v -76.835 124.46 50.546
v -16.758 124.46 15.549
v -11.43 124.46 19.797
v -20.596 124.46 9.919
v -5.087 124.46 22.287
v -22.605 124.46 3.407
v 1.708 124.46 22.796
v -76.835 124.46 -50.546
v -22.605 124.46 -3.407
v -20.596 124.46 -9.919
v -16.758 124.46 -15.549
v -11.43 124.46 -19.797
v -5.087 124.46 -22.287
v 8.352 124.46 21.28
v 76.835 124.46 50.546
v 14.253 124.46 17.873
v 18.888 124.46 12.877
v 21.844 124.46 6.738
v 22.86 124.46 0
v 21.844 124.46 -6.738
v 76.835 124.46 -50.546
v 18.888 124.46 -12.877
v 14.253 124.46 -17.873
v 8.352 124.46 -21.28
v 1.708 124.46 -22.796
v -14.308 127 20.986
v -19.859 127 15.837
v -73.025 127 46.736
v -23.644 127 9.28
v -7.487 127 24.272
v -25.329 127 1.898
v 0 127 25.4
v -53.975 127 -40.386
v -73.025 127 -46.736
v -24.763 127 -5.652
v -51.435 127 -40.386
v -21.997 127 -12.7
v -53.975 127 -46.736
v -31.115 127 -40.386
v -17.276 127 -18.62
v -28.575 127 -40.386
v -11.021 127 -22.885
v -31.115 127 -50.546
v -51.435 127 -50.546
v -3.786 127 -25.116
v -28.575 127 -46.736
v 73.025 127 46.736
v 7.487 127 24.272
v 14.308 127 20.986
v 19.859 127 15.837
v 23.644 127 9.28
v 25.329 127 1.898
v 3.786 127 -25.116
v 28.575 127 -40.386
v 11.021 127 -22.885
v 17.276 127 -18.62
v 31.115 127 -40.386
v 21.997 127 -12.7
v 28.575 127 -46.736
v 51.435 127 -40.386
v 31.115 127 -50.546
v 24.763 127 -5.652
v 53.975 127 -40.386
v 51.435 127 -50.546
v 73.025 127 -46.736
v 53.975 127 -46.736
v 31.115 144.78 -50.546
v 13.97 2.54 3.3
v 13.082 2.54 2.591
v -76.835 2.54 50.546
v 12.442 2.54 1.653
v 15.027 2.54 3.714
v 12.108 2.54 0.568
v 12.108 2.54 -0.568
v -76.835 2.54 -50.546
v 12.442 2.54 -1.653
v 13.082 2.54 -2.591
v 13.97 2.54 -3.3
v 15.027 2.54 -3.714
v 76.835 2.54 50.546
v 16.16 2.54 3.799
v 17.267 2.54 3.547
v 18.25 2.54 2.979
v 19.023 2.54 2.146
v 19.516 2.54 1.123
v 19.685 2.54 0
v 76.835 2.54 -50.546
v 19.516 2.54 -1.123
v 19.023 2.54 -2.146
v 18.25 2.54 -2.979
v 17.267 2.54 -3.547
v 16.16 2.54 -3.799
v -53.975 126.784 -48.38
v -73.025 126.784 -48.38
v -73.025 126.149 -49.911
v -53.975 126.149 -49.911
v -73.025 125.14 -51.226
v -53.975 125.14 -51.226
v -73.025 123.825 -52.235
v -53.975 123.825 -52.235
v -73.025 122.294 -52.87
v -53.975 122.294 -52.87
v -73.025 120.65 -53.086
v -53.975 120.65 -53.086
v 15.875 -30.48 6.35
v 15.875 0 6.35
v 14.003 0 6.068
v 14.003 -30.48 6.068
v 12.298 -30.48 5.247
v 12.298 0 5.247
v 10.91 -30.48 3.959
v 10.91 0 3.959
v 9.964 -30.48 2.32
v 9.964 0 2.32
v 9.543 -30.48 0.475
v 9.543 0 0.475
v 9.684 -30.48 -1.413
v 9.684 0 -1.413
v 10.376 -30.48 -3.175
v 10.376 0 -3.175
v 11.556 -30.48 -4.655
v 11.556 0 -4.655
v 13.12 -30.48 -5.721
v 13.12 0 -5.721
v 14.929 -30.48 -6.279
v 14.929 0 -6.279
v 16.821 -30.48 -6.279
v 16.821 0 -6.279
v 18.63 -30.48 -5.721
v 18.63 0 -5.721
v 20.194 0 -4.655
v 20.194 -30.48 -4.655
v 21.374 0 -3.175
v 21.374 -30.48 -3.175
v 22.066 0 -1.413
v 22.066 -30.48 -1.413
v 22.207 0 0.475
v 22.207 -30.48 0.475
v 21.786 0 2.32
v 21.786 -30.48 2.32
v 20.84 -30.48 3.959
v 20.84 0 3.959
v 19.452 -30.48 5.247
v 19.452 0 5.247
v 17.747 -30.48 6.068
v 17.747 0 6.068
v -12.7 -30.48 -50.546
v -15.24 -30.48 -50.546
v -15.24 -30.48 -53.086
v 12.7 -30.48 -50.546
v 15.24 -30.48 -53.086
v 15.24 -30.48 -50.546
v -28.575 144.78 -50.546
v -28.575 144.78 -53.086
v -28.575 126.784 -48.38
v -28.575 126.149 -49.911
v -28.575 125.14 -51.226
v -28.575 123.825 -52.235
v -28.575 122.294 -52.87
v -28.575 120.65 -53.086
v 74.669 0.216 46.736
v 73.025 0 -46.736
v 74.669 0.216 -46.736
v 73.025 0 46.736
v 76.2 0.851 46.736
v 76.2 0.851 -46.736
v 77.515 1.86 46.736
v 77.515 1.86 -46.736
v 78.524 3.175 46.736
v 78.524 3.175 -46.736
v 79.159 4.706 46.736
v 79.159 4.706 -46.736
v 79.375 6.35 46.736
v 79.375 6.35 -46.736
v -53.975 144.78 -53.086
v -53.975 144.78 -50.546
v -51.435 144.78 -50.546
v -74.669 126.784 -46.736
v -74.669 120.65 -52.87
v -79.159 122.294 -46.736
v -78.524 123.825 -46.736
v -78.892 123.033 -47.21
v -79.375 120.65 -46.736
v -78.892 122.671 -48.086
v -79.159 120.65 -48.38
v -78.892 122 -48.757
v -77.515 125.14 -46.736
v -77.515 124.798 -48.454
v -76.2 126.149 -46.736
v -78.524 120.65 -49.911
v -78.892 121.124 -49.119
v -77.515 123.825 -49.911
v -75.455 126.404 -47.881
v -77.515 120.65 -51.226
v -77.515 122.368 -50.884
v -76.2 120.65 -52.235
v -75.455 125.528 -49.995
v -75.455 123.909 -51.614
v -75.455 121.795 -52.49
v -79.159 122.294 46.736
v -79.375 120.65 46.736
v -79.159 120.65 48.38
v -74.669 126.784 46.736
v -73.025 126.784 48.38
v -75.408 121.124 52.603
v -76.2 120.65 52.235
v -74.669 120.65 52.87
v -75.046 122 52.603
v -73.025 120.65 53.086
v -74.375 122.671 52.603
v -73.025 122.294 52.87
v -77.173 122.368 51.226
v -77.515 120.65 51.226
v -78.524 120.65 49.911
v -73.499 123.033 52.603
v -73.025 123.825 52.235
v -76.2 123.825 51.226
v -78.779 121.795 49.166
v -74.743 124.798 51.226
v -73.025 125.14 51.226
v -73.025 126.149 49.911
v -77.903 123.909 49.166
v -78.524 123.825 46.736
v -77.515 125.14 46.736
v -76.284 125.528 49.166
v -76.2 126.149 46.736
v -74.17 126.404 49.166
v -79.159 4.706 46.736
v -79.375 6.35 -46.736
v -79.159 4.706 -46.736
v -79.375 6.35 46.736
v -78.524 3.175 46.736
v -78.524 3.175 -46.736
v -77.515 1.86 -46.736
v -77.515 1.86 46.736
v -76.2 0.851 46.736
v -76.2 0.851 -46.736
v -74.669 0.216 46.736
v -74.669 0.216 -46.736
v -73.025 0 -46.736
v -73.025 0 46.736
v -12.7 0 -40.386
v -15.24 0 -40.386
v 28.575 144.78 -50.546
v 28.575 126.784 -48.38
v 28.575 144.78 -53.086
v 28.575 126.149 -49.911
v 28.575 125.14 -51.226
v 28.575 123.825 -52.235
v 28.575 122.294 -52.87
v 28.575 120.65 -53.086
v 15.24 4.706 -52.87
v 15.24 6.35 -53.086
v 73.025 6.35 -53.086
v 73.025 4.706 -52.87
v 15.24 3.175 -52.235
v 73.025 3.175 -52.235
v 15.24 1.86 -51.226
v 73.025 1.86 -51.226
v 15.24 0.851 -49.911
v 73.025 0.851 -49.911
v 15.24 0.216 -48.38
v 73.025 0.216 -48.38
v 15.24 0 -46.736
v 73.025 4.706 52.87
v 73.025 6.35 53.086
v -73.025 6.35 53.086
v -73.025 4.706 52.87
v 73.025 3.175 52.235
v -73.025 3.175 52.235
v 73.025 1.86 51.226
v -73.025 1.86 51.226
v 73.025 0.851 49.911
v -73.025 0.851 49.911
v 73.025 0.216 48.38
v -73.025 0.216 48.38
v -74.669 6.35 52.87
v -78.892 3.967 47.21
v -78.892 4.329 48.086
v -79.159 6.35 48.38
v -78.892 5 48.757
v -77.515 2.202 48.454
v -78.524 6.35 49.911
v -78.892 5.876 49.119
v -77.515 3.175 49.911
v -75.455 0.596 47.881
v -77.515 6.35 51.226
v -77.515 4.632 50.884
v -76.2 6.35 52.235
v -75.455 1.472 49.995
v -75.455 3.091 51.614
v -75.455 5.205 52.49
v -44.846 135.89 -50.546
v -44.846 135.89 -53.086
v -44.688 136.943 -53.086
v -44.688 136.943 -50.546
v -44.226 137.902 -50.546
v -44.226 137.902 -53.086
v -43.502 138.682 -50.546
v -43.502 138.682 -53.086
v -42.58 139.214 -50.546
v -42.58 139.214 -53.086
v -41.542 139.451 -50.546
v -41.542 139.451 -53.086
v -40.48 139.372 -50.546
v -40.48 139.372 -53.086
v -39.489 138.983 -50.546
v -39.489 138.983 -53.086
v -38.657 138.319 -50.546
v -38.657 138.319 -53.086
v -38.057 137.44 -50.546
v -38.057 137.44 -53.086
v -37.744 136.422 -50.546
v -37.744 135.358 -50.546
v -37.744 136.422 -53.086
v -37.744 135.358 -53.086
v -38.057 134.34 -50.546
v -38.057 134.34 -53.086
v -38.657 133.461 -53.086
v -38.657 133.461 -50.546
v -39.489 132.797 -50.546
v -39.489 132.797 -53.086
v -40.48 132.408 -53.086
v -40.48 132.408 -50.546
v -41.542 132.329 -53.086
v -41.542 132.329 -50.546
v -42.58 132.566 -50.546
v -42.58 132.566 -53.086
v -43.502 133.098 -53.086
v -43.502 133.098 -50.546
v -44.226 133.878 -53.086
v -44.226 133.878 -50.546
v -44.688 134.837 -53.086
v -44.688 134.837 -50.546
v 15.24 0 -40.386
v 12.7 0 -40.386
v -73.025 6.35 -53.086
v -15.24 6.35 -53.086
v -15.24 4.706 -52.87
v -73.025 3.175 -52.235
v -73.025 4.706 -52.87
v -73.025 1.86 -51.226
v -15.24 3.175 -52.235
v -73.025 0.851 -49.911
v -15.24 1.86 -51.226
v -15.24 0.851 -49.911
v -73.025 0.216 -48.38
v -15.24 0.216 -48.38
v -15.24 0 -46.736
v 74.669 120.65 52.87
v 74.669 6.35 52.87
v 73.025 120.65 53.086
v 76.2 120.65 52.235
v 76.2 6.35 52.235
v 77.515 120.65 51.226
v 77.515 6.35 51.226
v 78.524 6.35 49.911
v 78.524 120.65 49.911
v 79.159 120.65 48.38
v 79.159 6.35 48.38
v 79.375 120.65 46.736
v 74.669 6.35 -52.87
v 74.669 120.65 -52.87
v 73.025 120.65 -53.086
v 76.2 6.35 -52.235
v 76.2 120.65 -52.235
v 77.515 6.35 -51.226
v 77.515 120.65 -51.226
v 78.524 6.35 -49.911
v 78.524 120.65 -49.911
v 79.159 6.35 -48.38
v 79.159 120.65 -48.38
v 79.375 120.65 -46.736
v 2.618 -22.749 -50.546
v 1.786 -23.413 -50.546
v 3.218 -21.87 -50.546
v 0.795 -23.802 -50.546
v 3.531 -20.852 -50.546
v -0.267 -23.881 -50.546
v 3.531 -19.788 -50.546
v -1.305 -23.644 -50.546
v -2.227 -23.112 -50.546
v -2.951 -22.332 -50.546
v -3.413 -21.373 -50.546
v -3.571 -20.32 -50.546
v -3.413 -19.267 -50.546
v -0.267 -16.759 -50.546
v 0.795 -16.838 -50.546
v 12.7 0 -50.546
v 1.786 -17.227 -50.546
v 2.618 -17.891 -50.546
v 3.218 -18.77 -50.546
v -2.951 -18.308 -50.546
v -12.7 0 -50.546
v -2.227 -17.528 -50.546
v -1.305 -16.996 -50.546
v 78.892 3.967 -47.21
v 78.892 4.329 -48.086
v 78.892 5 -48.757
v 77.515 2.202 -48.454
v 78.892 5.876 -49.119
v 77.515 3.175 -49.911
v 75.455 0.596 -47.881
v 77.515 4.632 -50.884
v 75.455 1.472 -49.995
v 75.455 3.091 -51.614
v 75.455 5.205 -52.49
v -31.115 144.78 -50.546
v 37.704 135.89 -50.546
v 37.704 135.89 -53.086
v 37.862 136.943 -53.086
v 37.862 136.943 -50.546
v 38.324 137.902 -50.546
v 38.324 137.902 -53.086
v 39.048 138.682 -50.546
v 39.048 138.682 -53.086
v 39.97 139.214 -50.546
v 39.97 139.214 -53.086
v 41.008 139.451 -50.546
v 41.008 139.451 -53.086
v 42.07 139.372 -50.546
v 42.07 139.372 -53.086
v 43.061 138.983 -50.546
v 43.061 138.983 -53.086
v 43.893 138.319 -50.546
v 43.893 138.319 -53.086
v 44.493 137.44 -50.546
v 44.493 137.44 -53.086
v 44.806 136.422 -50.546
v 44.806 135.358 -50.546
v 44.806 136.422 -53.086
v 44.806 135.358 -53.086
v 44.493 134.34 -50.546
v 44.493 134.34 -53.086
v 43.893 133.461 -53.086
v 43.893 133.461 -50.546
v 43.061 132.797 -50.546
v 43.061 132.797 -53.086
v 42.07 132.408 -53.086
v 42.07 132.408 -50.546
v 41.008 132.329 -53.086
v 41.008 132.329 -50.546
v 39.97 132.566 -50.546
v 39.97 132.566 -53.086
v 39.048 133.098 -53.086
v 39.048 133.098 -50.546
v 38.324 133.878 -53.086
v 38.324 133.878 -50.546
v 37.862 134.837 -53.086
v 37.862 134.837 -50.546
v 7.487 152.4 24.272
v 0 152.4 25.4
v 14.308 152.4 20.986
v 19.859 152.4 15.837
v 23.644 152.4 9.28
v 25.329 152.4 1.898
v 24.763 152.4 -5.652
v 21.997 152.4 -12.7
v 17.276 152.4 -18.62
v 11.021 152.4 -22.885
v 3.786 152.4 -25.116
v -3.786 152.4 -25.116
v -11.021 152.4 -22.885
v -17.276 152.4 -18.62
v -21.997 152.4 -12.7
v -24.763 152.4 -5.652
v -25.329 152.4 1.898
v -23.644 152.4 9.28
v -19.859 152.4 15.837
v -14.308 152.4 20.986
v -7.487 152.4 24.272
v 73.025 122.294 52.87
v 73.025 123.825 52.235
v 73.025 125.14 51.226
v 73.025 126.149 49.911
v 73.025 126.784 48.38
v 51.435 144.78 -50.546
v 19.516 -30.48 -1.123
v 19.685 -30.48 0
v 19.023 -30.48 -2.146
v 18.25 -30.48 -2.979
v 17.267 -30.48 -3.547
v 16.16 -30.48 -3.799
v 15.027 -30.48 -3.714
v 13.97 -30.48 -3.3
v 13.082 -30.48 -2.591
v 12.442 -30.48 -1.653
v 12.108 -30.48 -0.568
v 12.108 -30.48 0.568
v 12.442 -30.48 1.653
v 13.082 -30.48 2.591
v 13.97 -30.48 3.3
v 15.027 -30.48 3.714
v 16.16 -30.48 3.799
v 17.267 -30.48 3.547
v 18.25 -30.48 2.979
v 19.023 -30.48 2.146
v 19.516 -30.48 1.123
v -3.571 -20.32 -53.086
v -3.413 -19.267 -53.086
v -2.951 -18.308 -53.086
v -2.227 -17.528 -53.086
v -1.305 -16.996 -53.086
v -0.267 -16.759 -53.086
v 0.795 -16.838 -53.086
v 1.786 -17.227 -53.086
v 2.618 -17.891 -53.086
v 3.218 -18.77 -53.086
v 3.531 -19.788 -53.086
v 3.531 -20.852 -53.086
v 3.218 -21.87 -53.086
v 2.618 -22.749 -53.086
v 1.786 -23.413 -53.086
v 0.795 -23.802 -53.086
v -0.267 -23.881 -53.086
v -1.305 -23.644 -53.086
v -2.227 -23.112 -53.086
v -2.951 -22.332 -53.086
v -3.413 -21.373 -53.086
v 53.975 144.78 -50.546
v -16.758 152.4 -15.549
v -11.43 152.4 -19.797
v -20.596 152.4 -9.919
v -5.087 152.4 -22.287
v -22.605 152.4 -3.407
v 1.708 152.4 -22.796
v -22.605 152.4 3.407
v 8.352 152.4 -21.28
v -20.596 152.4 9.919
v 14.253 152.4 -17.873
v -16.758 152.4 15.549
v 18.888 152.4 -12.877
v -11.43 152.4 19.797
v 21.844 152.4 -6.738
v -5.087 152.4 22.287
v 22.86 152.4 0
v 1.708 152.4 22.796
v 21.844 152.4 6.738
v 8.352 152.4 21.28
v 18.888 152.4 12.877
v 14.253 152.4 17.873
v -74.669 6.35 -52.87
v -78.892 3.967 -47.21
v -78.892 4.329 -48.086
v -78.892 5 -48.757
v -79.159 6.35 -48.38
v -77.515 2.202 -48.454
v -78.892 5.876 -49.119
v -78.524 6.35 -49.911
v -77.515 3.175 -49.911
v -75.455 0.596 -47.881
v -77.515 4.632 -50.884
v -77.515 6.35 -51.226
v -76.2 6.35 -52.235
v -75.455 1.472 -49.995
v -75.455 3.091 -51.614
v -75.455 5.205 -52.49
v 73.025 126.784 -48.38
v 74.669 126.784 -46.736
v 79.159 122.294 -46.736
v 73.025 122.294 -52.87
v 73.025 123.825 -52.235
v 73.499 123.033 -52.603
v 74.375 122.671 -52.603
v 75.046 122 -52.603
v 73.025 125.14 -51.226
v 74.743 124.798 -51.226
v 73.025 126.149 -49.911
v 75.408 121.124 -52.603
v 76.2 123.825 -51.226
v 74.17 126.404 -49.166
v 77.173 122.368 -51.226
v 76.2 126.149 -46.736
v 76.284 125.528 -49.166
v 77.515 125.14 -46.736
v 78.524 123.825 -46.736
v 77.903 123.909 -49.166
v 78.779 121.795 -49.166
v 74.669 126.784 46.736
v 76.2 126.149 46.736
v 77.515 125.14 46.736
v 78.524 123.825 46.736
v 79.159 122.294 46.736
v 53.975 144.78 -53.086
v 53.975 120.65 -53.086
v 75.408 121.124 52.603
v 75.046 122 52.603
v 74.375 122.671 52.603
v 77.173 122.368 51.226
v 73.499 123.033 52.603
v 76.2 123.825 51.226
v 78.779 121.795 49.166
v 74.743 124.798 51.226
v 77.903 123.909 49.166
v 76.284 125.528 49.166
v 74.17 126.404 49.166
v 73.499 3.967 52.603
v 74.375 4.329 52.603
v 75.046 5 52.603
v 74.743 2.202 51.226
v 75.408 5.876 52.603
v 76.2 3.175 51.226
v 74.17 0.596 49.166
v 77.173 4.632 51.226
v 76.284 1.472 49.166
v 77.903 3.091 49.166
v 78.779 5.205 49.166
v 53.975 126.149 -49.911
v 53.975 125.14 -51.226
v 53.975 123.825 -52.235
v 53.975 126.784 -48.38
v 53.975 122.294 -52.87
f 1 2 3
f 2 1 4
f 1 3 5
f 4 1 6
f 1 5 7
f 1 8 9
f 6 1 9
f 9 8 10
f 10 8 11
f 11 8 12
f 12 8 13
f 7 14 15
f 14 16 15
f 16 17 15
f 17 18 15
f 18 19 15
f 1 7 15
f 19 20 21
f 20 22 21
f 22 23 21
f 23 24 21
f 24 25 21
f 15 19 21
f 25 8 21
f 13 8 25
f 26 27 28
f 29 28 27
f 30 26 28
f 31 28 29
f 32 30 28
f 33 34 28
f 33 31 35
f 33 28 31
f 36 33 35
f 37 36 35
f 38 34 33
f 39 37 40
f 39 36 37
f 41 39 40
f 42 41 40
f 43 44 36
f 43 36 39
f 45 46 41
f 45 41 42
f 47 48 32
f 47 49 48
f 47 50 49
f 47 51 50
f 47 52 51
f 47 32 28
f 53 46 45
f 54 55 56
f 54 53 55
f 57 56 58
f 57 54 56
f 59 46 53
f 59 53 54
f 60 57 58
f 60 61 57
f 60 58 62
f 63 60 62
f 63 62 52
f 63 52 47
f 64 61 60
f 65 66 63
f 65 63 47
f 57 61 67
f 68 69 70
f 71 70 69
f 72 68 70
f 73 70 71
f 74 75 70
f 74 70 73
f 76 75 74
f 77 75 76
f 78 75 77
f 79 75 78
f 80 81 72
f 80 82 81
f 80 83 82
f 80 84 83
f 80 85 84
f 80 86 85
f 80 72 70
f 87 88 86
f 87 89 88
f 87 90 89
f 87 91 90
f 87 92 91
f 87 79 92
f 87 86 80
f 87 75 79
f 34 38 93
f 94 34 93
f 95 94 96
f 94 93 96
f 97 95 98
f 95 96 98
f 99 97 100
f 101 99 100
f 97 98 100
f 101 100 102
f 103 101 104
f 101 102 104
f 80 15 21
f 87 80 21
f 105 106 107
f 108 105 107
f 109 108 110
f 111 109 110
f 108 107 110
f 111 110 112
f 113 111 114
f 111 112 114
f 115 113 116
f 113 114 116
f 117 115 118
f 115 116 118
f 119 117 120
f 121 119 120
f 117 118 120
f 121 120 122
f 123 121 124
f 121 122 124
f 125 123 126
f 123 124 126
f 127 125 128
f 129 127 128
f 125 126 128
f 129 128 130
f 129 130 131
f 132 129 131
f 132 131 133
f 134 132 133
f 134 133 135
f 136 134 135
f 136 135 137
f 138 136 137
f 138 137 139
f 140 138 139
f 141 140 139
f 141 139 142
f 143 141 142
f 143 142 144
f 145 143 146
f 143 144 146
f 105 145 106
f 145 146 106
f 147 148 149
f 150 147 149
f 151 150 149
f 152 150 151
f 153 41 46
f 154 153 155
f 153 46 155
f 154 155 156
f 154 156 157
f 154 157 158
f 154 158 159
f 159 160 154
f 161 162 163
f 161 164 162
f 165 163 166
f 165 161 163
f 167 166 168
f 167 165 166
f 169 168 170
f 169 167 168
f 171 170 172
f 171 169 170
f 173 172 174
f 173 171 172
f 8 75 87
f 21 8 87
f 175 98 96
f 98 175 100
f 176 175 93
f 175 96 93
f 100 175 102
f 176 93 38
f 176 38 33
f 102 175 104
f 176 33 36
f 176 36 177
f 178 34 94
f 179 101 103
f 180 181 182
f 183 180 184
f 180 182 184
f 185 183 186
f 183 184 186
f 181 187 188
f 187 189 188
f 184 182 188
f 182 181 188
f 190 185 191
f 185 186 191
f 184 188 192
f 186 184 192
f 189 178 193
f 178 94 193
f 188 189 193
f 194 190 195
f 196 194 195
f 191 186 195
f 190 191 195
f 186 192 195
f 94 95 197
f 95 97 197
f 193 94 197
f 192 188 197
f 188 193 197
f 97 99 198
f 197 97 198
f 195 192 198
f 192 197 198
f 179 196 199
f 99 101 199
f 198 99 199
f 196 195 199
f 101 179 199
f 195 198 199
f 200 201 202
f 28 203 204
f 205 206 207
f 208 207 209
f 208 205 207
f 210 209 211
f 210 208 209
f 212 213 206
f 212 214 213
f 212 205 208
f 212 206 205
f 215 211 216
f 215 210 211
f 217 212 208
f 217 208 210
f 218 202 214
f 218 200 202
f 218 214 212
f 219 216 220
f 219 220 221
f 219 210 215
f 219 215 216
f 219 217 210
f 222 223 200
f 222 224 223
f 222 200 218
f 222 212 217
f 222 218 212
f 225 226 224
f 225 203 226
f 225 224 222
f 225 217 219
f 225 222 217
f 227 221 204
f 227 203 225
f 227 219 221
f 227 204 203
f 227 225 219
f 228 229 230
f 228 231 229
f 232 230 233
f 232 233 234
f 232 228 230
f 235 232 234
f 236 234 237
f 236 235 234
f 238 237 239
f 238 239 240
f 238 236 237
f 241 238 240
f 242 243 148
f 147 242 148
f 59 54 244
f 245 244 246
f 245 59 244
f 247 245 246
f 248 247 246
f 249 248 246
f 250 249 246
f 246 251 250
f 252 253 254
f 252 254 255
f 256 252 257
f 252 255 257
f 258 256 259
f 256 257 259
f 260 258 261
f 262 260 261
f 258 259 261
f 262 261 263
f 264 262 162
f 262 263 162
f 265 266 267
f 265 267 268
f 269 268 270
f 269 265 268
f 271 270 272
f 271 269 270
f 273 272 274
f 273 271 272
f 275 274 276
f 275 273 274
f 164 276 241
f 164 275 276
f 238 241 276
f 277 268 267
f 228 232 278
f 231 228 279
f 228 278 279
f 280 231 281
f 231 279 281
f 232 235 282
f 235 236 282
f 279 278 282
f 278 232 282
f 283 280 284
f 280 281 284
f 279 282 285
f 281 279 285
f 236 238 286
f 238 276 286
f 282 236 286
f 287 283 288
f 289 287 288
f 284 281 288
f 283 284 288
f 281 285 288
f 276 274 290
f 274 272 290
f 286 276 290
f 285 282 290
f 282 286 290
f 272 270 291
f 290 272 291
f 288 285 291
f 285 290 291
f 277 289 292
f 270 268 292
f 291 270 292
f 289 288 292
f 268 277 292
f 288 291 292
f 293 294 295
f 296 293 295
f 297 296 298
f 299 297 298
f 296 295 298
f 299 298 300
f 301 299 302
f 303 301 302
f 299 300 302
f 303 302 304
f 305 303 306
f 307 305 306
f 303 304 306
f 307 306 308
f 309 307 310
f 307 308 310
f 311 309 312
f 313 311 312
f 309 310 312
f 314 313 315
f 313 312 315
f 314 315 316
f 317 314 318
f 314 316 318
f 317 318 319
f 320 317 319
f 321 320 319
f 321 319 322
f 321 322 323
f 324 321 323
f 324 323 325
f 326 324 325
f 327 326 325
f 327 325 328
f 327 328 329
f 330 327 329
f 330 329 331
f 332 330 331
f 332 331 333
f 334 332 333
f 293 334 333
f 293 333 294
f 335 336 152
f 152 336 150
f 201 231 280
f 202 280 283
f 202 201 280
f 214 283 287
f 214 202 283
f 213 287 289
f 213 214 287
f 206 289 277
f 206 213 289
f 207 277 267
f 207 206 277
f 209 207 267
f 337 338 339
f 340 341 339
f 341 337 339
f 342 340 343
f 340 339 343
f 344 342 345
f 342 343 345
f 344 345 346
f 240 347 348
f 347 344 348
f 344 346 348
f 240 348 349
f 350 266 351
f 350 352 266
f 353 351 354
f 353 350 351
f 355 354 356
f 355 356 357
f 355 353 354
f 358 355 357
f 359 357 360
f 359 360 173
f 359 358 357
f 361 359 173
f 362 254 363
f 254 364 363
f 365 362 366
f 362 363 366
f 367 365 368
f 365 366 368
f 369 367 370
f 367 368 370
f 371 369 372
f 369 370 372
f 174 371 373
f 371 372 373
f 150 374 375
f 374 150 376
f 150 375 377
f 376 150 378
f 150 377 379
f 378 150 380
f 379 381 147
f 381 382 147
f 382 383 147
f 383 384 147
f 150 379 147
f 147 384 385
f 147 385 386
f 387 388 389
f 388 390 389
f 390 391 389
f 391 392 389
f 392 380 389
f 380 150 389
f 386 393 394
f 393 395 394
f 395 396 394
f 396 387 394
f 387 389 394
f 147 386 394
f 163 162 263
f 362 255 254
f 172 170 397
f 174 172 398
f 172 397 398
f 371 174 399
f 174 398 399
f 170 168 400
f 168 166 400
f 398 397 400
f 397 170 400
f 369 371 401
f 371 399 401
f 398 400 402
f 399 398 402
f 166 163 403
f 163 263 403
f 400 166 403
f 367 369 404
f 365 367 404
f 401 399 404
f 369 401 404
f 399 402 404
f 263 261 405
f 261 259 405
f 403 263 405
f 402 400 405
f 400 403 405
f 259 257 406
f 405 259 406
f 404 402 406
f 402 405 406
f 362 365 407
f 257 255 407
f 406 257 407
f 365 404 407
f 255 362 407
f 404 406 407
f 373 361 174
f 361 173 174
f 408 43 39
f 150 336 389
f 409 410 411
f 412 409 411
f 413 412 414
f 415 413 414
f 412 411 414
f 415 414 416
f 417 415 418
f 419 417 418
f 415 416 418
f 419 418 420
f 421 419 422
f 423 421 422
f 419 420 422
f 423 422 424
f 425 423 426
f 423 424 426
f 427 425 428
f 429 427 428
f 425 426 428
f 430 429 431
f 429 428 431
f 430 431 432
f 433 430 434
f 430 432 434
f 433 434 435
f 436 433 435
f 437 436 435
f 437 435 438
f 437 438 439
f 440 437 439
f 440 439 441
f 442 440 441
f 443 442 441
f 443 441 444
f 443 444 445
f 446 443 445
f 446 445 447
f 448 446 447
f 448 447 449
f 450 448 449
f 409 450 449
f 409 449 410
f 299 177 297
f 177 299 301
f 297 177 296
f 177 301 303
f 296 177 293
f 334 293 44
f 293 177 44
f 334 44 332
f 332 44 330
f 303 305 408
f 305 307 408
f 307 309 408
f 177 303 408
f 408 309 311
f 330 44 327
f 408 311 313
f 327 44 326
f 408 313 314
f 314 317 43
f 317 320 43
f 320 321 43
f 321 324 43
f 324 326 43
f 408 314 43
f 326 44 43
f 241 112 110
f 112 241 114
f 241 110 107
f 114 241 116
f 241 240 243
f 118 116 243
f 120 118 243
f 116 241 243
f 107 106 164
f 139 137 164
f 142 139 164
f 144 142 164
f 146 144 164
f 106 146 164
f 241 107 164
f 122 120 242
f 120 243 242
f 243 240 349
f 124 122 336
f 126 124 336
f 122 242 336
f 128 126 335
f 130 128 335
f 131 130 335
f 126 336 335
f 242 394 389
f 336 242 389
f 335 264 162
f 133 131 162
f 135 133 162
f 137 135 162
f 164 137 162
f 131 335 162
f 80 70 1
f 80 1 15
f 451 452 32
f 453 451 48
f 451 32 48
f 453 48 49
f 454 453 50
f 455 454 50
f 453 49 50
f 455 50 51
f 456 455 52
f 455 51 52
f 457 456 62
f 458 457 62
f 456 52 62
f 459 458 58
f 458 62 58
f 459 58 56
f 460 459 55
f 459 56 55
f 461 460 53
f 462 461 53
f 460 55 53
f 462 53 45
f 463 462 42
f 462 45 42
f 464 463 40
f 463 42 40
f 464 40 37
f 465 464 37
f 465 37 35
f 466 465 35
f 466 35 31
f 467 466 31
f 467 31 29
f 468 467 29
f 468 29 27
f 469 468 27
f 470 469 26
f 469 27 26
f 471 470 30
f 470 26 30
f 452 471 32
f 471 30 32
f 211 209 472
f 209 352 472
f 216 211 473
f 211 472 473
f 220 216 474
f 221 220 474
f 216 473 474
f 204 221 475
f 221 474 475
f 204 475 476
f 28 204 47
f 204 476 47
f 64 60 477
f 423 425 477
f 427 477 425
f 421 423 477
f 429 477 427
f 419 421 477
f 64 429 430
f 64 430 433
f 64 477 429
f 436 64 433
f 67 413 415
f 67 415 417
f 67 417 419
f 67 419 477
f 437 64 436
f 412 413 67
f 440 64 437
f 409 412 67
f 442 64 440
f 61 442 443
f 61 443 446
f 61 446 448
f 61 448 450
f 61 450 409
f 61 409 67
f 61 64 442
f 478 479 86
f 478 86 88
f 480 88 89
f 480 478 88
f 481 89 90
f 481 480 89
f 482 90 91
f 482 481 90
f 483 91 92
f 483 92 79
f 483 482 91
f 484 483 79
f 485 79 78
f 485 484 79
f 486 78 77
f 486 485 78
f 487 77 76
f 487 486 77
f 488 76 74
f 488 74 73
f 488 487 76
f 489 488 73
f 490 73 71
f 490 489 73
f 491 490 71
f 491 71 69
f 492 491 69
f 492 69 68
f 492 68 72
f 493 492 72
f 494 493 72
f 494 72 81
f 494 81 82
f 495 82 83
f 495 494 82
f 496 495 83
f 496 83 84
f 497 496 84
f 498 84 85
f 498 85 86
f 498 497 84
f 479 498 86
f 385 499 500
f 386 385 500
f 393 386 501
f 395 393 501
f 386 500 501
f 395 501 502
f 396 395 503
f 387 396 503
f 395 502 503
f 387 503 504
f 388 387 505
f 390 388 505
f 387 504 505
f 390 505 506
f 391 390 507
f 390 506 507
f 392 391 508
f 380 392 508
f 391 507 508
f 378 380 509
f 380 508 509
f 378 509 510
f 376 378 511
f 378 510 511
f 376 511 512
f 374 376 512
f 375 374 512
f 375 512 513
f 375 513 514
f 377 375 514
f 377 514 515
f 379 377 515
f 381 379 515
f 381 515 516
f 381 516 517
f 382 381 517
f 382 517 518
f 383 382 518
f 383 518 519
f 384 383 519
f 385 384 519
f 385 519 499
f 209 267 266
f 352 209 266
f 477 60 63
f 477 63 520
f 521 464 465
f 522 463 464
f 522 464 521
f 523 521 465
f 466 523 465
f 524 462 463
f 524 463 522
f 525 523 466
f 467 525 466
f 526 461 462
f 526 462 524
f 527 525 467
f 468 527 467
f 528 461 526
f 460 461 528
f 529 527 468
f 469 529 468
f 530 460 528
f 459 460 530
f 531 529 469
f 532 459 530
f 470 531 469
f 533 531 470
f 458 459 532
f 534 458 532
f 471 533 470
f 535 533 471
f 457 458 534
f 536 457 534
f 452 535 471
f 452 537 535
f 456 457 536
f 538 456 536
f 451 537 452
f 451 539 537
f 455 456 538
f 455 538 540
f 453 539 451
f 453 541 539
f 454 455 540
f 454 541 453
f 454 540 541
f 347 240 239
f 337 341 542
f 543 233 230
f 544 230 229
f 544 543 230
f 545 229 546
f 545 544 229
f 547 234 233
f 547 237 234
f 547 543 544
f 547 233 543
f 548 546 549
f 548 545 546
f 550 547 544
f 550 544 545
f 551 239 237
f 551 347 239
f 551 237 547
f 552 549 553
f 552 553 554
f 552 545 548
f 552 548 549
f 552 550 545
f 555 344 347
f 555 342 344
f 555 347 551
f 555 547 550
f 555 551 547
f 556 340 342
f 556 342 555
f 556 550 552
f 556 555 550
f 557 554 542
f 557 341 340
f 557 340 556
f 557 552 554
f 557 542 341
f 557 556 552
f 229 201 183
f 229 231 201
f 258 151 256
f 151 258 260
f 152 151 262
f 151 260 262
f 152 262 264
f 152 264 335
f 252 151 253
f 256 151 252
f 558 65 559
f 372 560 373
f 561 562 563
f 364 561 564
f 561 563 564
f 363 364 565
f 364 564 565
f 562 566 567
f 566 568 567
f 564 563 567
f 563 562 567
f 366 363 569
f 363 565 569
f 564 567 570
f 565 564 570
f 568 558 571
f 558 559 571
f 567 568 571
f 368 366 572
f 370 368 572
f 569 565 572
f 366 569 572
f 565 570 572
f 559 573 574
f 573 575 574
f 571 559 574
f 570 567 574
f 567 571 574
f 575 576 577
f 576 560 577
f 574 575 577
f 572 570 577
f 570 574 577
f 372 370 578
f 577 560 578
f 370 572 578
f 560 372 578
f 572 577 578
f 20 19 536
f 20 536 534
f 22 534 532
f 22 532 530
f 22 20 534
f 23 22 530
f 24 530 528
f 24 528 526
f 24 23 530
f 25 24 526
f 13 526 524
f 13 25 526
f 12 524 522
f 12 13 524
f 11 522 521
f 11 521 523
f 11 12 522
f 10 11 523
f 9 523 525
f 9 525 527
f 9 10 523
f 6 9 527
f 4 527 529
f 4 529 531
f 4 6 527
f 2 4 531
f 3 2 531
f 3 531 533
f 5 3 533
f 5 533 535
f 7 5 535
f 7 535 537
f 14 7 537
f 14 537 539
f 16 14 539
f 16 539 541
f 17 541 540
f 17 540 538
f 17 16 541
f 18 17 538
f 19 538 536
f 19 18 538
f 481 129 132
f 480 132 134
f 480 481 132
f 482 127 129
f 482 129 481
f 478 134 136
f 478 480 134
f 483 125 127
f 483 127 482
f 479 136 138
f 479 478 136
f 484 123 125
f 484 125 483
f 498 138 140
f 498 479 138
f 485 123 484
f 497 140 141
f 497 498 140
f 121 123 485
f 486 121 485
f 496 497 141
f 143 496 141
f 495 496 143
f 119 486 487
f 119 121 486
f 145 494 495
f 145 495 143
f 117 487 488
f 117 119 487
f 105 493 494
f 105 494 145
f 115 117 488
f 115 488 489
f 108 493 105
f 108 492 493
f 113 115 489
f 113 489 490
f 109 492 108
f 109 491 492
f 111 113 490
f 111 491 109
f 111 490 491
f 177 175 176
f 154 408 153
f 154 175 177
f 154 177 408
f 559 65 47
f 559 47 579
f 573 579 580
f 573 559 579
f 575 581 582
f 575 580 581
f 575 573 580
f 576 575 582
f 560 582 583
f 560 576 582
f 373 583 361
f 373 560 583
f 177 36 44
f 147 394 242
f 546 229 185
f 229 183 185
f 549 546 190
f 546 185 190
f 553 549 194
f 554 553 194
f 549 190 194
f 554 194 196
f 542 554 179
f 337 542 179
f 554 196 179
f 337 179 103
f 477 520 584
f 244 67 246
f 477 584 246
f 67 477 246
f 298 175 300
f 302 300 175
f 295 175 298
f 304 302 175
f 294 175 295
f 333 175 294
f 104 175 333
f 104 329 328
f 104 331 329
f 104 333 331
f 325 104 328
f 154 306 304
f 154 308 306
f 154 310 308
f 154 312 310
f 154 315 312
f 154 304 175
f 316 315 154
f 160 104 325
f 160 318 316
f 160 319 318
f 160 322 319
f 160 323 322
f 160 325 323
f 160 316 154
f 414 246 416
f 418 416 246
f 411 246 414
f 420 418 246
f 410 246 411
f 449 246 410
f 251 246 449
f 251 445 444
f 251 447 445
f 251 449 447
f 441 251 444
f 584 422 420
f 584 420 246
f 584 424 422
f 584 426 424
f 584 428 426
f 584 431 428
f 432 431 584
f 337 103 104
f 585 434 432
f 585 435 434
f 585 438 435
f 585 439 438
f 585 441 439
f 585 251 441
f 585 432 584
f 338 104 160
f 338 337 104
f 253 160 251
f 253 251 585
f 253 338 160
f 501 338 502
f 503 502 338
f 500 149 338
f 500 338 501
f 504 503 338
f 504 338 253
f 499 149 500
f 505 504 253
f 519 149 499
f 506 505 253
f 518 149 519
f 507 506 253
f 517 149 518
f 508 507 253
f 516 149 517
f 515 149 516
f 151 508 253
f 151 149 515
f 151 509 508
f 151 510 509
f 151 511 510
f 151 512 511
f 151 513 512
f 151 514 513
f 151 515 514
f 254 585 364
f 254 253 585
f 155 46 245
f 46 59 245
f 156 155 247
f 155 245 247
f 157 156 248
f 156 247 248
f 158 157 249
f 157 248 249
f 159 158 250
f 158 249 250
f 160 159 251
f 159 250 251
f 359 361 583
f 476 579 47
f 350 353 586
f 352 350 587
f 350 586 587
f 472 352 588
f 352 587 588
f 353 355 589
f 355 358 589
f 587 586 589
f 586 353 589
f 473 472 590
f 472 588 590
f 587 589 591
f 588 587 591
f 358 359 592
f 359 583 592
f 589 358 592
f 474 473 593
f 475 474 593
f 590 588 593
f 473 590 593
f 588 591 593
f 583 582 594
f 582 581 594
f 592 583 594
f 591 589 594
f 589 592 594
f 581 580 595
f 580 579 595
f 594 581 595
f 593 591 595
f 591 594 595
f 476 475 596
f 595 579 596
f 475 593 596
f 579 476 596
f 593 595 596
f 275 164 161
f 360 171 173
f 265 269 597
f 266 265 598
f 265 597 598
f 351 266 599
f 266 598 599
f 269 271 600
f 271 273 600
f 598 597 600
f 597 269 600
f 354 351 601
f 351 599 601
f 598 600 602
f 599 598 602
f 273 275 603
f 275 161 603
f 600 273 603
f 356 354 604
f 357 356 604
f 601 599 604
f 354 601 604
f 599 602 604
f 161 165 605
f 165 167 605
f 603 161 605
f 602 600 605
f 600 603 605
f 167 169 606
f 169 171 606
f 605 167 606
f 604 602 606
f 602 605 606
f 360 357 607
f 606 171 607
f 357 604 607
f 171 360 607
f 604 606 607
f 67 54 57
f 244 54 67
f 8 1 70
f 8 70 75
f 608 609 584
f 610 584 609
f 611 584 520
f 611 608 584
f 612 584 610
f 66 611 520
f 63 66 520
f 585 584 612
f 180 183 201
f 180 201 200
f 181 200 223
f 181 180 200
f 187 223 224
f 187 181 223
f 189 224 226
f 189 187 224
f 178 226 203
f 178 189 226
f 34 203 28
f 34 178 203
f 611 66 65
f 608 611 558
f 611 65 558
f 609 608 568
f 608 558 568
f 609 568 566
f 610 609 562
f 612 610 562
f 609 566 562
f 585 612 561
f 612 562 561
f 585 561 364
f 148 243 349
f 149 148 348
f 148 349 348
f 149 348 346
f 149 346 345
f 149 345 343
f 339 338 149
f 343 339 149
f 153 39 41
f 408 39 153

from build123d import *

# Parameters (mm, degrees)
SKETCH1_W               = 158.75
SKETCH1_H               = 106.172
BOSS_EXTRUDE1_DEPTH     = 127
SKETCH2_R               = 25.4
BOSS_EXTRUDE2_DEPTH     = 25.4
SKETCH8_R               = 6.35
BOSS_EXTRUDE5_DEPTH     = 30.48
BOSS_EXTRUDE3_DEPTH     = 17.78
CUT_EXTRUDE2_DEPTH      = 196.580989608
CUT_EXTRUDE2_DEPTH_BACK = 196.580989608
BOSS_EXTRUDE4_DEPTH     = 30.48
SHELL1_START            = 2.54
SHELL1_OUTLINE_W        = 153.67
SHELL1_OUTLINE_H        = 101.092
SHELL1_DEPTH            = 121.92
SHELL1_START_2          = 124.46
SHELL1_2_OUTLINE_R      = 22.86
SHELL1_2_DEPTH          = 27.94
SHELL1_START_3          = -30.48
SHELL1_3_OUTLINE_R      = 3.81
SHELL1_3_DEPTH          = 33.02
CUT_EXTRUDE4_DEPTH      = 186.800131919
CUT_EXTRUDE4_DEPTH_BACK = 186.800131919
F_1_4_CLEARANCE_HOLE1_D = 7.14248
FILLET1_R               = 6.35


# Read off the part's stored shape, not the designer's step: Shell1
with BuildPart() as part:
    # Sketch1 → Boss-Extrude1 (new body)
    with BuildSketch(Plane(origin=(0, 0, 0), x_dir=(1, 0, 0), z_dir=(0, 1, 0))):
        Rectangle(SKETCH1_W, SKETCH1_H)
    extrude(amount=BOSS_EXTRUDE1_DEPTH)

    # Sketch2 → Boss-Extrude2 (add)
    with BuildSketch(Plane(origin=(0, 127, 0), x_dir=(1, 0, 0), z_dir=(0, 1, 0))):
        with Locations(Location((0, 0, 0), (0, 0, 270))):
            Circle(SKETCH2_R)
    extrude(amount=BOSS_EXTRUDE2_DEPTH)

    # Sketch8 → Boss-Extrude5 (add)
    with BuildSketch(Plane.XZ):
        with Locations(Location((15.875, 0, 0), (0, 0, 90))):
            Circle(SKETCH8_R)
    extrude(amount=BOSS_EXTRUDE5_DEPTH)

    # Sketch3 → Boss-Extrude3 (add)
    with BuildSketch(Plane(origin=(0, 127, 0), x_dir=(1, 0, 0), z_dir=(0, 1, 0))):
        Polygon((-53.975, 53.086), (-53.975, 40.386), (-51.435, 40.386), (-51.435, 50.546), (-31.115, 50.546), (-31.115, 40.386), (-28.575, 40.386), (-28.575, 53.086), align=None)
        Polygon((28.575, 53.086), (53.975, 53.086), (53.975, 40.386), (51.435, 40.386), (51.435, 50.546), (31.115, 50.546), (31.115, 40.386), (28.575, 40.386), align=None)
    extrude(amount=BOSS_EXTRUDE3_DEPTH)

    # Sketch5 → Cut-Extrude2 (cut, two sides: drawn at the far end of the back side and taken through both)
    with BuildSketch(Plane(origin=(31.115, 0, 0), x_dir=(0, 0, -1), z_dir=(1, 0, 0)).offset(-CUT_EXTRUDE2_DEPTH_BACK)):
        Polygon((40.386, 127), (50.546, 144.78), (40.386, 144.78), align=None)
    extrude(amount=CUT_EXTRUDE2_DEPTH + CUT_EXTRUDE2_DEPTH_BACK, mode=Mode.SUBTRACT)

    # Sketch7 → Boss-Extrude4 (add)
    with BuildSketch(Plane.XZ):
        Polygon((-15.24, -40.386), (-15.24, -53.086), (15.24, -53.086), (15.24, -40.386), (12.7, -40.386), (12.7, -50.546), (-12.7, -50.546), (-12.7, -40.386), align=None)
    extrude(amount=BOSS_EXTRUDE4_DEPTH)

    # Shell1 outline → Shell1 (cut)
    with BuildSketch(Plane(origin=(0, 0, 0), x_dir=(1, 0, 0), z_dir=(0, 1, 0)).offset(SHELL1_START)):
        Rectangle(SHELL1_OUTLINE_W, SHELL1_OUTLINE_H)
    extrude(amount=SHELL1_DEPTH, mode=Mode.SUBTRACT)

    # Shell1 2 outline → Shell1 2 (cut)
    with BuildSketch(Plane(origin=(0, 0, 0), x_dir=(1, 0, 0), z_dir=(0, 1, 0)).offset(SHELL1_START_2)):
        Circle(SHELL1_2_OUTLINE_R)
    extrude(amount=SHELL1_2_DEPTH, mode=Mode.SUBTRACT)

    # Shell1 3 outline → Shell1 3 (cut)
    with BuildSketch(Plane(origin=(0, 0, 0), x_dir=(1, 0, 0), z_dir=(0, 1, 0)).offset(SHELL1_START_3)):
        with Locations((15.875, 0)):
            Circle(SHELL1_3_OUTLINE_R)
    extrude(amount=SHELL1_3_DEPTH, mode=Mode.SUBTRACT)

    # Sketch9 → Cut-Extrude4 (cut, two sides: drawn at the far end of the back side and taken through both)
    with BuildSketch(Plane(origin=(-12.7, 0, 0), x_dir=(0, 0, -1), z_dir=(1, 0, 0)).offset(-CUT_EXTRUDE4_DEPTH_BACK)):
        Polygon((40.386, 0), (50.546, -30.48), (40.386, -30.48), align=None)
    extrude(amount=CUT_EXTRUDE4_DEPTH + CUT_EXTRUDE4_DEPTH_BACK, mode=Mode.SUBTRACT)

    # 1/4 Clearance Hole1 (through all)
    with Locations(Plane(origin=(-41.275, 135.89, -50.546), x_dir=(1, 0, 0), z_dir=(0, 0, 1))):
        with Locations((0, 0), (82.55, 0), (41.275, -156.21)):
            Hole(F_1_4_CLEARANCE_HOLE1_D / 2)

    # Fillet1
    fillet1_edges = [part.edges().sort_by_distance(p)[0] for p in [
        (-47.3075, 0, -53.086),
        (79.375, 127, 0),
        (66.675, 127, -53.086),
        (-66.675, 127, -53.086),
        (0, 127, -53.086),
        (-79.375, 127, 0),
        (47.3075, 0, -53.086),
        (79.375, 0, 0),
        (0, 0, 53.086),
        (-79.375, 0, 0),
        (-79.375, 63.5, -53.086),
        (79.375, 63.5, -53.086),
        (79.375, 63.5, 53.086),
        (-79.375, 63.5, 53.086),
        (0, 127, 53.086),
    ]]
    fillet(fillet1_edges, radius=FILLET1_R)


solid = part.part
